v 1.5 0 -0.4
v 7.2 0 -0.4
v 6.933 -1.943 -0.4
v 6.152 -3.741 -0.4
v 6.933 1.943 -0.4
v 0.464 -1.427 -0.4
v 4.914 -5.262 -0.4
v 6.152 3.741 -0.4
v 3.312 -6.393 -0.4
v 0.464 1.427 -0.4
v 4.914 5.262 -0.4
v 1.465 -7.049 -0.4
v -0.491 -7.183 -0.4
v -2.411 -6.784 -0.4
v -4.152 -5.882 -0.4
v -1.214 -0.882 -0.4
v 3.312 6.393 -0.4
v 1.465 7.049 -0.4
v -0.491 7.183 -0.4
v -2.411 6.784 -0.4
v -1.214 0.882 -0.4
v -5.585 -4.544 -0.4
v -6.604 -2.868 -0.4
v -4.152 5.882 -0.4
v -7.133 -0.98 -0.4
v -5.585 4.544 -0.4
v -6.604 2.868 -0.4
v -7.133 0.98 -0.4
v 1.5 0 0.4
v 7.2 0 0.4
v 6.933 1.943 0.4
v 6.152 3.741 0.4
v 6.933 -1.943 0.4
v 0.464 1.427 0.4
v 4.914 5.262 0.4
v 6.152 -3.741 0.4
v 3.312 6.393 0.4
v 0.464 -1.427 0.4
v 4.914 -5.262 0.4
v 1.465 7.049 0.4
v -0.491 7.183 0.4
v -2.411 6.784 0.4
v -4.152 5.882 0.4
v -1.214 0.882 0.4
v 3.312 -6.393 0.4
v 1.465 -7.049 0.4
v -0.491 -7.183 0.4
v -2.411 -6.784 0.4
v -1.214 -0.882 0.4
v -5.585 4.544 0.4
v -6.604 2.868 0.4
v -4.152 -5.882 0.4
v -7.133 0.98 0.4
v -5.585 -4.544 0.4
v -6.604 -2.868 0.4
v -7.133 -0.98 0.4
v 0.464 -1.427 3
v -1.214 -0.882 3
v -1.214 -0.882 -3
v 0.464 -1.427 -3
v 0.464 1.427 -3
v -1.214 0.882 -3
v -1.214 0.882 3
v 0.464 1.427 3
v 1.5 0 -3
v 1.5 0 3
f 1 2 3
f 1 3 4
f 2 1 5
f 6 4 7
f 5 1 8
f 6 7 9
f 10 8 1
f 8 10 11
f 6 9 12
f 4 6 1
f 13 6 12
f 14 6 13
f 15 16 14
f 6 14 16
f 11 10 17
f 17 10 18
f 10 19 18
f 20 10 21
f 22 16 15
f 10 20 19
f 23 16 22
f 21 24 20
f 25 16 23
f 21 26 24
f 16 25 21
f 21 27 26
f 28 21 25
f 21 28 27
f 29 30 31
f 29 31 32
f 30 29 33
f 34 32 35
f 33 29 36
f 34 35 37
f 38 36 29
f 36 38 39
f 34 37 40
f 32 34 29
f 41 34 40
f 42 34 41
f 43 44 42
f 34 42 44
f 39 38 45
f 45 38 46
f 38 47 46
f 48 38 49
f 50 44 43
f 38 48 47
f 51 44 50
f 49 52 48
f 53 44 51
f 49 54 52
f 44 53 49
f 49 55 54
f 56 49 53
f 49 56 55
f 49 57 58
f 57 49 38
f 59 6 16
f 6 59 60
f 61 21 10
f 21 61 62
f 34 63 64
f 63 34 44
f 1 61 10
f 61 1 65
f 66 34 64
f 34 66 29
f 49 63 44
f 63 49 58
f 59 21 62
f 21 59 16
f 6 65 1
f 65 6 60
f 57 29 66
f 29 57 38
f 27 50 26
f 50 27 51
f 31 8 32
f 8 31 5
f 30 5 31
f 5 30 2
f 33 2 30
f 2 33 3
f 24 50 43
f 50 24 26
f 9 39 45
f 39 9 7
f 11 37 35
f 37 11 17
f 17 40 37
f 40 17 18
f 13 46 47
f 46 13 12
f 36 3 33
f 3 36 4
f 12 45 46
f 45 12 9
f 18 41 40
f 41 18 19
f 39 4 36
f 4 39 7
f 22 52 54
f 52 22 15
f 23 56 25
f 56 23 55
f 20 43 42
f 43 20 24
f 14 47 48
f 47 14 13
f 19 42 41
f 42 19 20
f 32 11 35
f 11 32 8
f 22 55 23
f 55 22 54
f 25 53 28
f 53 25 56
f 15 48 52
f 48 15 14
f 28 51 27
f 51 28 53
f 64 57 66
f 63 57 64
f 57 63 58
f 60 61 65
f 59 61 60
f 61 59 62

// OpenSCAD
// Parameters
inner_diameter_mm = 3; //[1.5:6:0.1]
outer_diameter_mm = 12; //[6:24:0.1]
thickness_mm = 0.8; //[0.4:1.6:0.05]
eps_mm = 0.8; //[0.2:2:0.1]
grommet_top_height_mm = 0.8; //[0.4:2:0.05]
grommet_top_radial_mm = 1.2; //[0.6:3:0.1]
screw_shank_diameter_mm = 3; //[1.5:6:0.1]
screw_length_mm = 6; //[3:20:0.5]

// Penny Washer - complete geometry
module penny_washer() {
  color("Silver") {
    difference() {
      // Washer body
      cylinder(r=outer_diameter_mm/2, h=thickness_mm, center=true);
      // Inner through-hole
      translate([0, 0, 0])
        cylinder(r=inner_diameter_mm/2, h=thickness_mm + 2*eps_mm, center=true);
    }
  }
}

// Round Grommet Top - complete geometry
module round_grommet_top() {
  color("DimGray") {
    difference() {
      // Outer grommet
      translate([0, 0, thickness_mm/2 + grommet_top_height_mm/2 - eps_mm])
        cylinder(r=outer_diameter_mm/2 + grommet_top_radial_mm, h=grommet_top_height_mm, center=true);
      // Inner hole
      translate([0, 0, thickness_mm/2 + grommet_top_height_mm/2 - eps_mm])
        cylinder(r=inner_diameter_mm/2, h=grommet_top_height_mm + 2*eps_mm, center=true);
    }
  }
}

// Round Grommet Assembly - complete geometry
module round_grommet_assembly() {
  union() {
    penny_washer();
    round_grommet_top();
  }
}

// Screw And Washer - complete geometry
module screw_and_washer() {
  color("Black") {
    union() {
      round_grommet_assembly();
      // Screw shank
      translate([0, 0, 0])
        cylinder(r=screw_shank_diameter_mm/2, h=screw_length_mm, center=true);
    }
  }
}

// Final Assembly
module assembly() {
  screw_and_washer();
}

assembly();
